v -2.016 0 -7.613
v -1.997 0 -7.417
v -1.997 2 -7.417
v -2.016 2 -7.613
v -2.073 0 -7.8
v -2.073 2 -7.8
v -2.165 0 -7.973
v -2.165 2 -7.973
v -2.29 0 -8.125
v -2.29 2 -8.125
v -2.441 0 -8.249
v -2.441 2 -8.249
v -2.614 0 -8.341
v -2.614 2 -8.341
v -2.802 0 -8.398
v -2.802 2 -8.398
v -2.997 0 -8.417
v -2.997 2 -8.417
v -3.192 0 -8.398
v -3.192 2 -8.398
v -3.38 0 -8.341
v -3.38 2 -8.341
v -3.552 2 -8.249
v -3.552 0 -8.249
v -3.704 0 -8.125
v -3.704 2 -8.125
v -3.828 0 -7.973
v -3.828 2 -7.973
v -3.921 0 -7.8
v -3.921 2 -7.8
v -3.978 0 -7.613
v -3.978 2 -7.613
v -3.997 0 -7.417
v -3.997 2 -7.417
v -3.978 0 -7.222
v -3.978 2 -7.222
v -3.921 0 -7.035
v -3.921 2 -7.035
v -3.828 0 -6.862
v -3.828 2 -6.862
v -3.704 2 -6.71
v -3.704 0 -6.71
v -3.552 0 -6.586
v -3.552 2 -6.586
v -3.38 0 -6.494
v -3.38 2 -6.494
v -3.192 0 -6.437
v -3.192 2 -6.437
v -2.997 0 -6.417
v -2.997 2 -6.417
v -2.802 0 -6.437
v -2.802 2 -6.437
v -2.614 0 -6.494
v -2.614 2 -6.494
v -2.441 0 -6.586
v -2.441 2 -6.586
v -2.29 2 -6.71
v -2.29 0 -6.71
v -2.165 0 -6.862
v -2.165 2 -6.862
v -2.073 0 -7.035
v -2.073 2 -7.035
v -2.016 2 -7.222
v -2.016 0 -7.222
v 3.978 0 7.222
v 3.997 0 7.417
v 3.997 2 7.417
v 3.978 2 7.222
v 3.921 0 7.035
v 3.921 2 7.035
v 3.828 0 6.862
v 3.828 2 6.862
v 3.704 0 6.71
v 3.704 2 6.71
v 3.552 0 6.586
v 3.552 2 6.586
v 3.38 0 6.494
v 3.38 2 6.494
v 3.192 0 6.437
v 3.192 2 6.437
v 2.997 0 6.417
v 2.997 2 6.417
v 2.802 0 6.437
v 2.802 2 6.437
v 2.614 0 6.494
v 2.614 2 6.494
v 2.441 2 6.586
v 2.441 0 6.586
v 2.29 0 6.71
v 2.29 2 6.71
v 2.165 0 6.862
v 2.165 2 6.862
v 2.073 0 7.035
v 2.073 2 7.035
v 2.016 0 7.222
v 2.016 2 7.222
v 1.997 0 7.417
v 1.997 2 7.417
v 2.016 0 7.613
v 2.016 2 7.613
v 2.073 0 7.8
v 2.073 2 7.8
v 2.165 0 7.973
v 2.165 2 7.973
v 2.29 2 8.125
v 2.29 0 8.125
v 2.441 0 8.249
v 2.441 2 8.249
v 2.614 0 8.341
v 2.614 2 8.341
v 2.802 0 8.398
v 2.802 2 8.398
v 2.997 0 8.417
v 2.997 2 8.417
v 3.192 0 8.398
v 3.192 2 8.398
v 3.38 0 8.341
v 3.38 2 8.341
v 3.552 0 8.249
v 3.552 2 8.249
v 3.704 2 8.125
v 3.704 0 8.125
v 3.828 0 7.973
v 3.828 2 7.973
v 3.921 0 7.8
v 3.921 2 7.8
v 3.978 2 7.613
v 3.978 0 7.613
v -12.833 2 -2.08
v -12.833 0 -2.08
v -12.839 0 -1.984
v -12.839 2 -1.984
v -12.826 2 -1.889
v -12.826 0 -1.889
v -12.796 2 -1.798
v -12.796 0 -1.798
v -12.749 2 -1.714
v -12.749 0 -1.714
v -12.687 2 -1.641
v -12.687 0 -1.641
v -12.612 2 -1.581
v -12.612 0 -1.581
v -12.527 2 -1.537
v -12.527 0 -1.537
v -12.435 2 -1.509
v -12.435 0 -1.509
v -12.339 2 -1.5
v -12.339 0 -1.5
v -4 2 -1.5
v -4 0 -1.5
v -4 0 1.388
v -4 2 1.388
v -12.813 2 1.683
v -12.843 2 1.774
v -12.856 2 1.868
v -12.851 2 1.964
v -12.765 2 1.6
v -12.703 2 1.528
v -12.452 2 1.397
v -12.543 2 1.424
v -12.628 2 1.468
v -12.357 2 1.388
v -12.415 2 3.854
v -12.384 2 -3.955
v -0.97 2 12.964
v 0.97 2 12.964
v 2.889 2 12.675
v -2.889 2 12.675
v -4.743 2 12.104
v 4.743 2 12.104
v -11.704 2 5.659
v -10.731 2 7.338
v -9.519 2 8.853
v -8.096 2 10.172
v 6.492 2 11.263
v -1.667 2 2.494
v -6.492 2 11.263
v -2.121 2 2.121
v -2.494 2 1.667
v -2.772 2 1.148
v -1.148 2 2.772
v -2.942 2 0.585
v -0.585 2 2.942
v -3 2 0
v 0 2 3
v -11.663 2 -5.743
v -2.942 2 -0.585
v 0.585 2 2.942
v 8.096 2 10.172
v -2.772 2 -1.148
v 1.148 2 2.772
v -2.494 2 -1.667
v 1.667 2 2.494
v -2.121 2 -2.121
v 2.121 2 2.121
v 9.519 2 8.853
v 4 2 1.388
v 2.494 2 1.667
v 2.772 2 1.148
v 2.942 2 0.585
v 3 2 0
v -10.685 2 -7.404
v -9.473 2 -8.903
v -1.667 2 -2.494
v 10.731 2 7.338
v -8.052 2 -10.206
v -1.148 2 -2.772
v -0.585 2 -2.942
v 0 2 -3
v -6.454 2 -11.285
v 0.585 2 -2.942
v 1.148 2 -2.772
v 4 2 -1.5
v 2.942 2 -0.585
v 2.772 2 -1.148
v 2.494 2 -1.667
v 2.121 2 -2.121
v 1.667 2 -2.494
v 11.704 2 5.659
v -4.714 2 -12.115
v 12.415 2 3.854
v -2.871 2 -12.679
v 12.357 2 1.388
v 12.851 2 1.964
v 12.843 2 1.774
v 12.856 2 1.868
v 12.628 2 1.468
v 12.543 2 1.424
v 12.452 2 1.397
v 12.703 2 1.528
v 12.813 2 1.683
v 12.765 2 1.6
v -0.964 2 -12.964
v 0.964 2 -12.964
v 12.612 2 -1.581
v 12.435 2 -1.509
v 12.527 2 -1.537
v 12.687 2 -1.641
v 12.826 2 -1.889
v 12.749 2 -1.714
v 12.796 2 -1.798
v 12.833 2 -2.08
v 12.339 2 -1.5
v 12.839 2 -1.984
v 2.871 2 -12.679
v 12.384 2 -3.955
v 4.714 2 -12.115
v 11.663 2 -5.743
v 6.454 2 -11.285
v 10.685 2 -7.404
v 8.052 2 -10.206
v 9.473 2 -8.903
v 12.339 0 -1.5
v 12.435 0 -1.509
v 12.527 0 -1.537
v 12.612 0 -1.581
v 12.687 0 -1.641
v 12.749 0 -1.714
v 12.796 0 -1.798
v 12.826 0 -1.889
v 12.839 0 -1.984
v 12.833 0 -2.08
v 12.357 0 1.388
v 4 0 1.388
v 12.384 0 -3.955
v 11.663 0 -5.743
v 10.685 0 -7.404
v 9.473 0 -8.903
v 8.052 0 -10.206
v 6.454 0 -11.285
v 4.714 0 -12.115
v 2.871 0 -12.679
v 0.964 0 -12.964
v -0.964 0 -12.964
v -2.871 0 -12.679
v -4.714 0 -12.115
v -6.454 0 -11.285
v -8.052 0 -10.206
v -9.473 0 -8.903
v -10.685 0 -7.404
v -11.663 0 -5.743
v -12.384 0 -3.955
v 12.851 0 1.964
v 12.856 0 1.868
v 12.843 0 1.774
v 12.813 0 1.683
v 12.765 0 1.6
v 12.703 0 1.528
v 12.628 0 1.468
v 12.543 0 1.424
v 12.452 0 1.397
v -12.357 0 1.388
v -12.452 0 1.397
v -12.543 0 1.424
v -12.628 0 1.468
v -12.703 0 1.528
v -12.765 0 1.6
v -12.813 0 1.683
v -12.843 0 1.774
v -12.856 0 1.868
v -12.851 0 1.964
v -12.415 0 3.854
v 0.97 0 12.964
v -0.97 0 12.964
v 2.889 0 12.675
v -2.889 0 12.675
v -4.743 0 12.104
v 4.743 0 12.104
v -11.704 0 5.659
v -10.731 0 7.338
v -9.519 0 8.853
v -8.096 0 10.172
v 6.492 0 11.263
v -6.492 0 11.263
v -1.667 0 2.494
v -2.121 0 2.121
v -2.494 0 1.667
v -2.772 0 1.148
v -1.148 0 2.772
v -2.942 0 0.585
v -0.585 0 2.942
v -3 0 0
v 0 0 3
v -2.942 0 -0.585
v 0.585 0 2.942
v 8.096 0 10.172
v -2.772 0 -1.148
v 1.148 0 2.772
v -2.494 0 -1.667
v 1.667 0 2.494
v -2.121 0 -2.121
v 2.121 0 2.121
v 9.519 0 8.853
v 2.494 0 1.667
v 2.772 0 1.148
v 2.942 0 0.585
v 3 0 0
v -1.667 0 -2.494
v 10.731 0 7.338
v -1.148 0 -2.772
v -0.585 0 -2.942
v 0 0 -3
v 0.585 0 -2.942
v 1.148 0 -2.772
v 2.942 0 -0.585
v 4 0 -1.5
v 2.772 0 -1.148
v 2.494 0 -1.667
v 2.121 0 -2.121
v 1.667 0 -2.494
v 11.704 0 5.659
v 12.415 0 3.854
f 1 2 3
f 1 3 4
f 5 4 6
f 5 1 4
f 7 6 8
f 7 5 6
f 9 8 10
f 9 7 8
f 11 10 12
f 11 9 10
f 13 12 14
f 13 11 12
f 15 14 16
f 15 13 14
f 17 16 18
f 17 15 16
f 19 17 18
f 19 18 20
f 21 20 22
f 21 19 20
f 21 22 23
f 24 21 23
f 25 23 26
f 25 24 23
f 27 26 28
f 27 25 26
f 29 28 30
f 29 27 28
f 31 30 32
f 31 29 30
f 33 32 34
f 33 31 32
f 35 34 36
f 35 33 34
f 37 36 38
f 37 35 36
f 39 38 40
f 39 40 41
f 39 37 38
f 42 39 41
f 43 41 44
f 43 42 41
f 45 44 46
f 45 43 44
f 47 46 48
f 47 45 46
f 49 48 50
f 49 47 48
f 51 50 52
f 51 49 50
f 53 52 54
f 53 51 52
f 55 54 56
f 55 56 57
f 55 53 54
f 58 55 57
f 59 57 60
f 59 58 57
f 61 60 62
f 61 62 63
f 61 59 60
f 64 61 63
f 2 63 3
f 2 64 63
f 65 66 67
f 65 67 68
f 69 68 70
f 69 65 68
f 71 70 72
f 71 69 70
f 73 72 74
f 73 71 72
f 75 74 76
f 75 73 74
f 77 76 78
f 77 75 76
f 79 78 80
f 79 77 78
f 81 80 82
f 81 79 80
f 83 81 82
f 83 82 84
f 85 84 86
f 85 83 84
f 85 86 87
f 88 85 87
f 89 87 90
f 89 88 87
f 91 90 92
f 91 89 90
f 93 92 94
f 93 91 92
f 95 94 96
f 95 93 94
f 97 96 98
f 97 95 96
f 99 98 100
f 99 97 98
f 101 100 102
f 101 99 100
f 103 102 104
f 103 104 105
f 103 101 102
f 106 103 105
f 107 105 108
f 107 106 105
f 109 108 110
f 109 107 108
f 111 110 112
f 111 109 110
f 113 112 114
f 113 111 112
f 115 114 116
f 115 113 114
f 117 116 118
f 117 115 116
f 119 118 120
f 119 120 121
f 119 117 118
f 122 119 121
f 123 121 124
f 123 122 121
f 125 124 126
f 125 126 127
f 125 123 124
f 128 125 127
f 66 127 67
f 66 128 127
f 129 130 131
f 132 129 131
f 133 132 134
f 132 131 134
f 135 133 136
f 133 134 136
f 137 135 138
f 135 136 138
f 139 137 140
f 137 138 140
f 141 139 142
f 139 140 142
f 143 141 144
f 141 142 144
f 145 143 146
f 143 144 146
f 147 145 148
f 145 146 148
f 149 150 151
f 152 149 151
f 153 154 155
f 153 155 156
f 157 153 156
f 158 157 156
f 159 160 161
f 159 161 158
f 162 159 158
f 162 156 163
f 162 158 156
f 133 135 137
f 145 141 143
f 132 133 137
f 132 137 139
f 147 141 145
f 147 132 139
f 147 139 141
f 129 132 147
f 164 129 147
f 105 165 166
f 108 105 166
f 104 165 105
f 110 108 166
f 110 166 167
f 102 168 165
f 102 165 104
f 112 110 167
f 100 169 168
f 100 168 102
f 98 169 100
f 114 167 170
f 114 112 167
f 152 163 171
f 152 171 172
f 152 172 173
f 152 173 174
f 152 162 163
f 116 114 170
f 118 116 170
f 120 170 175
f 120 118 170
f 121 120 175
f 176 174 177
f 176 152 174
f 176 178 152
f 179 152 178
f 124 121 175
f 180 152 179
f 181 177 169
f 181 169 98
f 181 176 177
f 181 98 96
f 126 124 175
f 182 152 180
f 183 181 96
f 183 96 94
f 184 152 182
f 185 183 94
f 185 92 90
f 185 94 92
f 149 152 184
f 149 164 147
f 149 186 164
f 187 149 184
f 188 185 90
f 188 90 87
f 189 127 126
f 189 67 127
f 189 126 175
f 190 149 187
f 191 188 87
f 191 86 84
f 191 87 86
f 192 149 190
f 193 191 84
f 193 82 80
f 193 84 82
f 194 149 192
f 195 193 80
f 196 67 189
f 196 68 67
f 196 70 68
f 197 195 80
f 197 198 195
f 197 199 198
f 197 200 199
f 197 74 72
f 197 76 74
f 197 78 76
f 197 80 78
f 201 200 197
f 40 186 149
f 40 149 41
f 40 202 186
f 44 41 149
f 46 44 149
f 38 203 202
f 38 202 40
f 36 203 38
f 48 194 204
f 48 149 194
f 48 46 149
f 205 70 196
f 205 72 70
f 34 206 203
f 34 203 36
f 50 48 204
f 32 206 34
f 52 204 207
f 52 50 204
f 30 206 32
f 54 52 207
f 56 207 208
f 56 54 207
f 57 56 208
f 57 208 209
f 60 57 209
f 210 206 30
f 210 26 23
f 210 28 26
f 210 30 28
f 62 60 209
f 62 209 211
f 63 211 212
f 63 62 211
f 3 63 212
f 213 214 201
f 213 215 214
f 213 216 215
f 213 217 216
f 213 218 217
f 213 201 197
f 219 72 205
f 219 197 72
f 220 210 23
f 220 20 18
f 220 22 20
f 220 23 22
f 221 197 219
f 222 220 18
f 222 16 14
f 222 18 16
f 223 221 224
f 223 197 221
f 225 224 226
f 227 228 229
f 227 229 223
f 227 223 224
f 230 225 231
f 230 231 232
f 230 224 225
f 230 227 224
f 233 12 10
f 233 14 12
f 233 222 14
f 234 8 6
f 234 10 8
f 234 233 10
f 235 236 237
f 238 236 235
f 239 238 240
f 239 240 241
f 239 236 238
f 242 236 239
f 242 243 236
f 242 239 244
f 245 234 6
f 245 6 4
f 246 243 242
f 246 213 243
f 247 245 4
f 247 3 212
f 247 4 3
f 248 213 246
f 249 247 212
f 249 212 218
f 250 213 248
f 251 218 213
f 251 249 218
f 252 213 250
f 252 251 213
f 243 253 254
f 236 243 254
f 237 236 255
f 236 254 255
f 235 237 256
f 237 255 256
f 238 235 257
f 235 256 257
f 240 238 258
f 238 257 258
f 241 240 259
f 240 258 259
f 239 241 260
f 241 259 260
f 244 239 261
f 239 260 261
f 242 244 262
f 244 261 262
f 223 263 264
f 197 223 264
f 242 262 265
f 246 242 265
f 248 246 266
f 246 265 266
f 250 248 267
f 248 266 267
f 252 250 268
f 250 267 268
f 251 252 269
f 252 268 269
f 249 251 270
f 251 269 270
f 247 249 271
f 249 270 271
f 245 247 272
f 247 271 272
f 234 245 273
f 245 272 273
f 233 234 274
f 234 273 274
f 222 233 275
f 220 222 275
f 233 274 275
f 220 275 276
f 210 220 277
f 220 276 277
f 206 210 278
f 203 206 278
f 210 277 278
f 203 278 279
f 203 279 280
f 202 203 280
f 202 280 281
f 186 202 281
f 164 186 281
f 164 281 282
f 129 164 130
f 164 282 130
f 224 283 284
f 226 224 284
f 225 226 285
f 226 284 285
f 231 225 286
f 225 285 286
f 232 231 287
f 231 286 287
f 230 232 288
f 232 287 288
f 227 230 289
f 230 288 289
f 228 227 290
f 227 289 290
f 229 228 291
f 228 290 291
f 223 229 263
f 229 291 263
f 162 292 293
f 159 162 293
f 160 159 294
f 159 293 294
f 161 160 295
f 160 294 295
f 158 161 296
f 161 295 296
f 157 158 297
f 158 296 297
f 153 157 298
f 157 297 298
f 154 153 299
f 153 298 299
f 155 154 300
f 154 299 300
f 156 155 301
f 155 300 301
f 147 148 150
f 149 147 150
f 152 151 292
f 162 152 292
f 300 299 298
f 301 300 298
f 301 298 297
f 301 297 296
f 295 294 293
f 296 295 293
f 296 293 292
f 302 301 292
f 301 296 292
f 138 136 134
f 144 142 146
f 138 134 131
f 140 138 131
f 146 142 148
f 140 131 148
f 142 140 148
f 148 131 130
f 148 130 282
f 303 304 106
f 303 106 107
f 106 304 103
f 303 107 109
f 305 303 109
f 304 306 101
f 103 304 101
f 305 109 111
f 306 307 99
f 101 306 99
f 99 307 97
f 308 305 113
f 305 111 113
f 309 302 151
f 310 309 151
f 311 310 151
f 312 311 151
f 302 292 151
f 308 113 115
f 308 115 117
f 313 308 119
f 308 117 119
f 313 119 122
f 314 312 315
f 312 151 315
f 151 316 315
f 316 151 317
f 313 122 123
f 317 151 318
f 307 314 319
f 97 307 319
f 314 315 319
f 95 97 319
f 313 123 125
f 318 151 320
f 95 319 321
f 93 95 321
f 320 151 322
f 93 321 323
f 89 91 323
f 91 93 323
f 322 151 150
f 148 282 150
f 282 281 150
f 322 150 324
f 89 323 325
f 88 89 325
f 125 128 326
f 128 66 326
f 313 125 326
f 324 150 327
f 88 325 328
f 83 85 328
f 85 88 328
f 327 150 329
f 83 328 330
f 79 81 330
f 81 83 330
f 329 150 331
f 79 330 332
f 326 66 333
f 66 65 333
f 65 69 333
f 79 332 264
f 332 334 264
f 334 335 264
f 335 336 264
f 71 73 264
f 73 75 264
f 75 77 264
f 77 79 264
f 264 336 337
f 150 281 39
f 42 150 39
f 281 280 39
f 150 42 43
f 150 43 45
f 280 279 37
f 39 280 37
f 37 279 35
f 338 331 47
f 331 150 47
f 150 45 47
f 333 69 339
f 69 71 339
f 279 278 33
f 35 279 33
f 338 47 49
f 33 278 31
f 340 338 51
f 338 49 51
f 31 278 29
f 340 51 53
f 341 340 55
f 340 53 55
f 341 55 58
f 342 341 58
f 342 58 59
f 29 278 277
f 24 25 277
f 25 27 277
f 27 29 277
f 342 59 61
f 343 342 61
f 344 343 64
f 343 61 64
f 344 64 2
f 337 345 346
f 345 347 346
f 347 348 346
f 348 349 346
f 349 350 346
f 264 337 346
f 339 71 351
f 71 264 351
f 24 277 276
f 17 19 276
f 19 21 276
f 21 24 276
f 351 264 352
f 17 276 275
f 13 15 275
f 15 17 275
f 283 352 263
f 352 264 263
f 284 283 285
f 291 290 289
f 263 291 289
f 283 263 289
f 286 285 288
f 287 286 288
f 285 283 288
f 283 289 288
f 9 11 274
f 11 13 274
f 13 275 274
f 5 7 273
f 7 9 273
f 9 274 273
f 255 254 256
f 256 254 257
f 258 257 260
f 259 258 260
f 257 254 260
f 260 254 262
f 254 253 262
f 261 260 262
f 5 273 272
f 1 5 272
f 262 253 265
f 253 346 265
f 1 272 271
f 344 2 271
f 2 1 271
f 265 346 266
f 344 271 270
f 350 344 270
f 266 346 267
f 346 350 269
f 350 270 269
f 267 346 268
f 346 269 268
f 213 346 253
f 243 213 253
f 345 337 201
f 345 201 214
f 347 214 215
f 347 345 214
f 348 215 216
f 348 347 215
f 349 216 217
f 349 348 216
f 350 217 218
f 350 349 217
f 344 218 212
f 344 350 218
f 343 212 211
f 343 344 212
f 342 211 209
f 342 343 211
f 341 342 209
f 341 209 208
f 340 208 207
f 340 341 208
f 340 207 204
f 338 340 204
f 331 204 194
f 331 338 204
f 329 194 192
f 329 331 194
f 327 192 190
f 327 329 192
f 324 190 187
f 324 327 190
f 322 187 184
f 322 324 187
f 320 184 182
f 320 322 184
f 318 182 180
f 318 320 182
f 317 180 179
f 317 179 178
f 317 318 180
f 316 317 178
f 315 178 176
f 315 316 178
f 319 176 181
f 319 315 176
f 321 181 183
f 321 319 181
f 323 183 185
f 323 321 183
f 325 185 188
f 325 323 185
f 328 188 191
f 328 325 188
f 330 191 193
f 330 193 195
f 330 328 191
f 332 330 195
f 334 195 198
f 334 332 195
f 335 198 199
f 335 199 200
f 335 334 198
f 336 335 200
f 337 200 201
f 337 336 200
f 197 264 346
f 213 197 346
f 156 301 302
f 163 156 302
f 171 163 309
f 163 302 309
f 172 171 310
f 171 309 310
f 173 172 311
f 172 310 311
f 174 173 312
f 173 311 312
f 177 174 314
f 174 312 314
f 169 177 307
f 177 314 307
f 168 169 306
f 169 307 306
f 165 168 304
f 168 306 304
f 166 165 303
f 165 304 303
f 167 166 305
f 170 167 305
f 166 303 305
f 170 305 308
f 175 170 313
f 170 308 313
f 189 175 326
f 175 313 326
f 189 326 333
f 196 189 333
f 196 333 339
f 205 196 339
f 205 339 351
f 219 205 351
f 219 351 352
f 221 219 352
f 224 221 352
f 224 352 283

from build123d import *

# Parameters (mm, degrees)
SKETCH1_R           = 1
SKETCH1_R_2         = 3
BOSS_EXTRUDE1_DEPTH = 2


with BuildPart() as part:
    # Sketch1 → Boss-Extrude1 (new body)
    with BuildSketch(Plane(origin=(0, 0, 0), x_dir=(1, 0, 0), z_dir=(0, 1, 0))):
        with BuildLine():
            Line((-12.338962679, 1.5), (-4, 1.5))
            Line((-4, 1.5), (-4, -1.388047838))
            Line((-4, -1.388047838), (-12.356588338, -1.388047838))
            ThreePointArc((-12.356588338, -1.388047838), (-12.735904141, -1.562287924), (-12.850851872, -1.963569752))
            ThreePointArc((-12.850851872, -1.963569752), (0, -13), (12.850851872, -1.963569752))
            ThreePointArc((12.850851872, -1.963569752), (12.735904141, -1.562287924), (12.356588338, -1.388047838))
            Line((12.356588338, -1.388047838), (4, -1.388047838))
            Line((4, -1.388047838), (4, 1.5))
            Line((4, 1.5), (12.338962679, 1.5))
            ThreePointArc((12.338962679, 1.5), (12.719751335, 1.675962965), (12.832521186, 2.08))
            ThreePointArc((12.832521186, 2.08), (0, 13), (-12.832521186, 2.08))
            ThreePointArc((-12.832521186, 2.08), (-12.719751335, 1.675962965), (-12.338962679, 1.5))
        make_face()
        with Locations((-2.996852747, 7.417470837)):
            Circle(SKETCH1_R, mode=Mode.SUBTRACT)
        with Locations((2.996852747, -7.417470837)):
            Circle(SKETCH1_R, mode=Mode.SUBTRACT)
        Circle(SKETCH1_R_2, mode=Mode.SUBTRACT)
    extrude(amount=BOSS_EXTRUDE1_DEPTH)


solid = part.part
